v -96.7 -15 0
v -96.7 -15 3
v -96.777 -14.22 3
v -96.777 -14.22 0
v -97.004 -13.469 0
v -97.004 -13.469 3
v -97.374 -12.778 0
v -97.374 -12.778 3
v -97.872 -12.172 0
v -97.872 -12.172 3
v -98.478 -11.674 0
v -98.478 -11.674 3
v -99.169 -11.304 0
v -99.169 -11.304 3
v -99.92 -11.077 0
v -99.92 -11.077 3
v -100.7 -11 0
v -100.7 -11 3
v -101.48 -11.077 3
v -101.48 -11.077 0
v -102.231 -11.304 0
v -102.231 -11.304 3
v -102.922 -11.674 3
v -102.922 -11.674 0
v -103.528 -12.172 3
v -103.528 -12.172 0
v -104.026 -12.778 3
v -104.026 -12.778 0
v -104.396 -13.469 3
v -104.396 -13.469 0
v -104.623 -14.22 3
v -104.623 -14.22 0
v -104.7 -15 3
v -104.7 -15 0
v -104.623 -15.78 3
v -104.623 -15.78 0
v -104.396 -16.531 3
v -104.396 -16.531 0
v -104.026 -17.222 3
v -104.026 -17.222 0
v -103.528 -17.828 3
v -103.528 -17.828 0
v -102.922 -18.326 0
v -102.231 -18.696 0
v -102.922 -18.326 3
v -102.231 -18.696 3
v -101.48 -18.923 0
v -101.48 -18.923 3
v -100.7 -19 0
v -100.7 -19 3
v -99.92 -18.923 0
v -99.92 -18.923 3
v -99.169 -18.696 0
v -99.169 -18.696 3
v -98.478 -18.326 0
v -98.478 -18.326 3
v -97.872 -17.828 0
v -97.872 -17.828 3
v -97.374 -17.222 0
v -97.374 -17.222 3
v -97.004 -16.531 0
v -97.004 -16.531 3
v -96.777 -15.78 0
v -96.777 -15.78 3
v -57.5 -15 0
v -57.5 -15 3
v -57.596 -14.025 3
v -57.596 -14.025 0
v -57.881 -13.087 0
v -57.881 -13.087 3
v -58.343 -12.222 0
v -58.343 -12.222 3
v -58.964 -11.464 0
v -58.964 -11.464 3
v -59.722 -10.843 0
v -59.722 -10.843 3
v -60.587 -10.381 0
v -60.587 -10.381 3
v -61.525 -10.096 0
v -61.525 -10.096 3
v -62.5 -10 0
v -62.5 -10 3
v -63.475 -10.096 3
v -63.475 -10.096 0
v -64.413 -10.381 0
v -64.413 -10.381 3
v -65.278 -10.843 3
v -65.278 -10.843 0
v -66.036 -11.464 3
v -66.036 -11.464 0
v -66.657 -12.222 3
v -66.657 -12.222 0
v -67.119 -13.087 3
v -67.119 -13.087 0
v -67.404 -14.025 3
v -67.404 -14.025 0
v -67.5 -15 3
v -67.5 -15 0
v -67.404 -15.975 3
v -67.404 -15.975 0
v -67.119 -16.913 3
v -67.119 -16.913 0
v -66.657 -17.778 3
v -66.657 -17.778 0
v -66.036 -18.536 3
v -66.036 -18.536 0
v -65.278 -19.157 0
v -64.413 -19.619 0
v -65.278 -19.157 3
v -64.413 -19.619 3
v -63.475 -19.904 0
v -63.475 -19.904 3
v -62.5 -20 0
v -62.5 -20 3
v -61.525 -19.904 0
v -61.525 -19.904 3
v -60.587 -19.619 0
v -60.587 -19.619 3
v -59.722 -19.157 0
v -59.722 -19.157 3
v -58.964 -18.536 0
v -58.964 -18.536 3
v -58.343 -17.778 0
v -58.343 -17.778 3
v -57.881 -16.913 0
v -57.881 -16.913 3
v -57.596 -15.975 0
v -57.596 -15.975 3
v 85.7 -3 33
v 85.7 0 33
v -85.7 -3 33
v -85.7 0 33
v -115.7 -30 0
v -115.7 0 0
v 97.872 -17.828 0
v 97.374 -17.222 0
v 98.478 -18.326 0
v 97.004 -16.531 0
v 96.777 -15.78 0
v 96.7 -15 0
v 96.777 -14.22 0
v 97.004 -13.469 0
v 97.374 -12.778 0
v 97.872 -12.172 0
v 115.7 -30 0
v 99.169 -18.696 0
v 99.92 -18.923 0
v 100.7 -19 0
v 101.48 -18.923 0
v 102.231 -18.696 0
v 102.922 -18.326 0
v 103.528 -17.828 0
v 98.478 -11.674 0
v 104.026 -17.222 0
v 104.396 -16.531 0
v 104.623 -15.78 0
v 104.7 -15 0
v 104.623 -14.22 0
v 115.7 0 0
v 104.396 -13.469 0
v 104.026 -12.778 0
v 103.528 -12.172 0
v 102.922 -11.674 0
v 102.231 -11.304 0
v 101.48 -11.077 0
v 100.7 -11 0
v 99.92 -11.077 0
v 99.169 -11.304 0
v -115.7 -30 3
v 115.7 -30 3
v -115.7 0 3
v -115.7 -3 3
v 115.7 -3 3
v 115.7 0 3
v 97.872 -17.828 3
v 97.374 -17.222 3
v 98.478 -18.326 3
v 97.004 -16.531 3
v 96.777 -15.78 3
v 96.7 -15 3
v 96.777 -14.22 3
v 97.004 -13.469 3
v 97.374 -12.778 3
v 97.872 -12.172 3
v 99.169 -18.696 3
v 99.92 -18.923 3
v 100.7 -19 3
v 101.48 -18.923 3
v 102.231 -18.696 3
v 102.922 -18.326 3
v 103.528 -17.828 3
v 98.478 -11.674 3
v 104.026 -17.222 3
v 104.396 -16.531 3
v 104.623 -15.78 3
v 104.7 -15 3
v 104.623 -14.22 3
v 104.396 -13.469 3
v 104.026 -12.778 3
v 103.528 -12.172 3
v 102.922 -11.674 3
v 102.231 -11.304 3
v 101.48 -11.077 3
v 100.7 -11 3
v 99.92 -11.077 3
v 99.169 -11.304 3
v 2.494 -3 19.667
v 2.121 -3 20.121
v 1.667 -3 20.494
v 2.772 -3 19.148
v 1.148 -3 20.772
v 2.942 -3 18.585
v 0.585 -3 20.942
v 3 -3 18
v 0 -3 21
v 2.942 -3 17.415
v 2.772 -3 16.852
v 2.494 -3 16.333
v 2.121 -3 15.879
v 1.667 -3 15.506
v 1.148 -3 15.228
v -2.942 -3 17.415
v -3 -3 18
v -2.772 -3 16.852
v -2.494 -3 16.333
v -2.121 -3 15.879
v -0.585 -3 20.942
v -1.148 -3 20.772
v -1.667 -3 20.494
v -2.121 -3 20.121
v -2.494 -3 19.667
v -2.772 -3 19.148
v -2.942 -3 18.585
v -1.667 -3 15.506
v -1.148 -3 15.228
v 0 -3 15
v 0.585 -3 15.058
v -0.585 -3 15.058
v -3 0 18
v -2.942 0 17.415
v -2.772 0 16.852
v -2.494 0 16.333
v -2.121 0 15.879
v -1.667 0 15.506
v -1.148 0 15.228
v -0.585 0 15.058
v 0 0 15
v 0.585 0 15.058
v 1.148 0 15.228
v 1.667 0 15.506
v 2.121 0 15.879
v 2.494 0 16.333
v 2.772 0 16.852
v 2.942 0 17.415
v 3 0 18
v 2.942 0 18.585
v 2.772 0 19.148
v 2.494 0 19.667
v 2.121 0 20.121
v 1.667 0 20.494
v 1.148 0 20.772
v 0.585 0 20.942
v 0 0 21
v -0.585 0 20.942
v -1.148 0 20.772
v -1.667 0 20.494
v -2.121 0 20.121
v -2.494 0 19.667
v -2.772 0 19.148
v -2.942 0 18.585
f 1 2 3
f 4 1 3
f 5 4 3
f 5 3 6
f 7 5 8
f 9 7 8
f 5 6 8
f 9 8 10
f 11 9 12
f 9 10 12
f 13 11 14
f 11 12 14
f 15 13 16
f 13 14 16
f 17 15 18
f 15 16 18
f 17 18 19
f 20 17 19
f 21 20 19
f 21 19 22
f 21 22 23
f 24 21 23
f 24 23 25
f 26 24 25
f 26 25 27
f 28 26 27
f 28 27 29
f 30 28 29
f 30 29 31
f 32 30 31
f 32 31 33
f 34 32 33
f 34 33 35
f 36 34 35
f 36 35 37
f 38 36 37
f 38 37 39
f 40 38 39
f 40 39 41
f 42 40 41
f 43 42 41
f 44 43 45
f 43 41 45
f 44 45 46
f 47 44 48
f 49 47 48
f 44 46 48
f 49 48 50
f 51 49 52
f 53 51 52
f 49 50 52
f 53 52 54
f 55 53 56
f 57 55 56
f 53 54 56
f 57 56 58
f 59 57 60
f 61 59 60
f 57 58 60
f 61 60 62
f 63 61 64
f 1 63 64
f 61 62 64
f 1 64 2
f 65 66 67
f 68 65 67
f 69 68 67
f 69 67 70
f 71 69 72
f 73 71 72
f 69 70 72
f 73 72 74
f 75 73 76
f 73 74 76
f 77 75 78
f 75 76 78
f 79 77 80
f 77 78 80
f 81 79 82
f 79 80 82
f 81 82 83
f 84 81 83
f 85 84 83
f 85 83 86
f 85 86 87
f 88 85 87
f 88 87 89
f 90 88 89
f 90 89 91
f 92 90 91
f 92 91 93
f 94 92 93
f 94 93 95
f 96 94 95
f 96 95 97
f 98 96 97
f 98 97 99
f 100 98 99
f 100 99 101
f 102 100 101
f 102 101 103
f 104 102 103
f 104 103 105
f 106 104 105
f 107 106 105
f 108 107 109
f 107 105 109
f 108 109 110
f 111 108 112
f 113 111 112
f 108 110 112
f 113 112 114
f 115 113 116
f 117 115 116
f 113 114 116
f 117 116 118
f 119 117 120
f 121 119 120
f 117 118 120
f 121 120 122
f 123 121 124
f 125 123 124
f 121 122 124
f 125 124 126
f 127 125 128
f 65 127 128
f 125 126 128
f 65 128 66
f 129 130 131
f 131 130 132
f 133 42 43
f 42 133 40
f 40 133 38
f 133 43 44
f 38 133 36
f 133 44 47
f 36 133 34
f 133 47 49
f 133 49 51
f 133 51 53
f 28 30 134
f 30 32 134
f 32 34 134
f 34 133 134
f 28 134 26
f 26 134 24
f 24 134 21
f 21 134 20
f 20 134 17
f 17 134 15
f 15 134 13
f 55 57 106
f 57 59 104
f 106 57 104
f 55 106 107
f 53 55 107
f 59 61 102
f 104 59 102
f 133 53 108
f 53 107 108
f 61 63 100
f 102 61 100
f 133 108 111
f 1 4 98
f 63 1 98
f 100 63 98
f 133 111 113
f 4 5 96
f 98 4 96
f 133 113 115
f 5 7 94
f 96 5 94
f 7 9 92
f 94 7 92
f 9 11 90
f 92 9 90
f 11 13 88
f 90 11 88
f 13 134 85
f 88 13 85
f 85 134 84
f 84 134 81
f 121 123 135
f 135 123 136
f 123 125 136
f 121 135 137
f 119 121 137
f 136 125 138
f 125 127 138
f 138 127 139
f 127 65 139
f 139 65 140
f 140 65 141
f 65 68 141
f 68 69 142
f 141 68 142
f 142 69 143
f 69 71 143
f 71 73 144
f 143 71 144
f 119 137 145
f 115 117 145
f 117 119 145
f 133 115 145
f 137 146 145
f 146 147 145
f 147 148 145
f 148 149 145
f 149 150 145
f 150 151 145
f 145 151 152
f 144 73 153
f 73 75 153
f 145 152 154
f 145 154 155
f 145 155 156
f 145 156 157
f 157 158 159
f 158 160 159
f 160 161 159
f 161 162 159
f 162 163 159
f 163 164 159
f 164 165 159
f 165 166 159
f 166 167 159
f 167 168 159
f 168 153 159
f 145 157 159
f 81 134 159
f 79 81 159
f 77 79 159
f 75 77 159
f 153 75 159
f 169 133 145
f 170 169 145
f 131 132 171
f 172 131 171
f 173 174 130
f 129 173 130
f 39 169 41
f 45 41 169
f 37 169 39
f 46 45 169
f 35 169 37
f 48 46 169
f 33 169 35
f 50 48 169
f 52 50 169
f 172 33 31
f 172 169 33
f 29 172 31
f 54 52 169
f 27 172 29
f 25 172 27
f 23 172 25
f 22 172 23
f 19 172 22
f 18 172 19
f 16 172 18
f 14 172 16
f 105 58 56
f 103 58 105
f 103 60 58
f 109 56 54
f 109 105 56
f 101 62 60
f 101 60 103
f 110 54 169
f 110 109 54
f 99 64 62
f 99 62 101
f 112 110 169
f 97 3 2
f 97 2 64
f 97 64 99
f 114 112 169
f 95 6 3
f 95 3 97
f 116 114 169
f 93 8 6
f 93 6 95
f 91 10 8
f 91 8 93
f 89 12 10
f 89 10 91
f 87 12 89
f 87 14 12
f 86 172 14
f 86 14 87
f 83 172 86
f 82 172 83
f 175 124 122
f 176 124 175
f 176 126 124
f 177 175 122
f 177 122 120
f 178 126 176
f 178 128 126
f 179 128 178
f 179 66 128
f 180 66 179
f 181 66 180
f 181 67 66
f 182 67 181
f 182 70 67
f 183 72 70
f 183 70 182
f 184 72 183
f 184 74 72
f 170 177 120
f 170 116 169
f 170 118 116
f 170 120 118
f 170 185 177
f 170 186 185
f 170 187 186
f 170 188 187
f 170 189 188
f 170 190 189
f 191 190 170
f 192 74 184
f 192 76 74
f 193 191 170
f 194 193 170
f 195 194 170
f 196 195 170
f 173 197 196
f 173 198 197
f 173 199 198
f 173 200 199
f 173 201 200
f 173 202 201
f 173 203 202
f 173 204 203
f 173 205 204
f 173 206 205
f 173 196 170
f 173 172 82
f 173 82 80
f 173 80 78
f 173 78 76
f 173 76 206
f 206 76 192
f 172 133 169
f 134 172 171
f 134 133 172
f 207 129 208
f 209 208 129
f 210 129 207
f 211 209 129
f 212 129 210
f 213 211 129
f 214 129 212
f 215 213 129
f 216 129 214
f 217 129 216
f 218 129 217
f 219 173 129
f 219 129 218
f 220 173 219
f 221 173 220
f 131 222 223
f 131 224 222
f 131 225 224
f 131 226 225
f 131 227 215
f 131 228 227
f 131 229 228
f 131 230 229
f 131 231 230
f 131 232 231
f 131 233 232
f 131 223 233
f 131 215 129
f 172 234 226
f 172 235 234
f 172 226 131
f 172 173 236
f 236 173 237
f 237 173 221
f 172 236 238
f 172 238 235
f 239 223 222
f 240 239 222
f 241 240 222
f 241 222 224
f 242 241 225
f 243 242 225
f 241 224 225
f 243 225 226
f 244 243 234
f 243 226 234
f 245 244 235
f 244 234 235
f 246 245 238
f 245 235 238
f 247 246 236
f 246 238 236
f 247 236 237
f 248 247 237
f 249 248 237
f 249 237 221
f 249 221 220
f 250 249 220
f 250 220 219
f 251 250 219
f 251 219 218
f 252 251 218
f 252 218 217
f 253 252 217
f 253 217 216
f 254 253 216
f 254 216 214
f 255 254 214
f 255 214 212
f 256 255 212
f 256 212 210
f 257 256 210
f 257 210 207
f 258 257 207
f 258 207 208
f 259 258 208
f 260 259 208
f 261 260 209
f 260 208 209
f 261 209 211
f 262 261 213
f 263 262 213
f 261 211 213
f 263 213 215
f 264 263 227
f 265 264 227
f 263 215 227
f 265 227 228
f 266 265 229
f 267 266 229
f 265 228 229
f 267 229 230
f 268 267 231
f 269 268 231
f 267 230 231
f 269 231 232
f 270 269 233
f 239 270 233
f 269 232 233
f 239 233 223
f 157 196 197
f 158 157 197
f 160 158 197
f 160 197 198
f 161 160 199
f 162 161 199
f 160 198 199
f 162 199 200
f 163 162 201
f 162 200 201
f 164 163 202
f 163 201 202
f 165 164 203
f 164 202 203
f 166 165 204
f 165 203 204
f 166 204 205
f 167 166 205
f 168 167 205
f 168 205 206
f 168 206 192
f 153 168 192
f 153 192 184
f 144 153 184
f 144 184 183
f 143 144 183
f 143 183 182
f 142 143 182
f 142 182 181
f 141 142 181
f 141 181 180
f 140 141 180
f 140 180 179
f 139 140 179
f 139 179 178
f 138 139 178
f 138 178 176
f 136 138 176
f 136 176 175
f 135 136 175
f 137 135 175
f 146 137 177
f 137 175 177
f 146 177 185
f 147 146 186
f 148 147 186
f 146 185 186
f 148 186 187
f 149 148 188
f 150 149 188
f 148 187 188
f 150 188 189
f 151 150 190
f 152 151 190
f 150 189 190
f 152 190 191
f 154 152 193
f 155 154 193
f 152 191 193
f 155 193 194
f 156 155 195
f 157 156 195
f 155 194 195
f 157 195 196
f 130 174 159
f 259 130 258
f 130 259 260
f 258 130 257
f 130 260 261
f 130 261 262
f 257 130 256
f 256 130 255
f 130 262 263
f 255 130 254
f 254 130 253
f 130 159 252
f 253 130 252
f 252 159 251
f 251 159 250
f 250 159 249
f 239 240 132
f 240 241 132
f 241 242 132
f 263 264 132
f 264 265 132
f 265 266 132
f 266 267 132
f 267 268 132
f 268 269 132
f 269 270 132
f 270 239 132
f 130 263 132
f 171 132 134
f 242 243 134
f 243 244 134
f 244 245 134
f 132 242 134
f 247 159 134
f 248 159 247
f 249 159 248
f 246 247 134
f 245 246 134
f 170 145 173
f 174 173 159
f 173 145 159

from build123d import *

# Parameters (mm, degrees)
SKETCH1_W                  = 231.4
SKETCH1_H                  = 30
BOSS_EXTRUDE1_DEPTH        = 3
BOSS_EXTRUDE2_DEPTH        = 3
F_8_0_8_DIAMETER_HOLE1_D   = 8
F_10_0_10_DIAMETER_HOLE1_D = 10
F_6_0_6_DIAMETER_HOLE1_D   = 6


with BuildPart() as part:
    # Sketch1 → Boss-Extrude1 (new body)
    with BuildSketch(Plane.XY):
        with Locations((0, -15)):
            Rectangle(SKETCH1_W, SKETCH1_H)
    extrude(amount=BOSS_EXTRUDE1_DEPTH)

    # Sketch2 → Boss-Extrude2 (add)
    with BuildSketch(Plane(origin=(0, 0, 0), x_dir=(1, 0, 0), z_dir=(0, 1, 0))):
        Polygon((-115.7, -3), (115.7, -3), (85.7, -33), (-85.7, -33), align=None)
    extrude(amount=-BOSS_EXTRUDE2_DEPTH)

    # Ø8.0 (8) Diameter Hole1 (through all)
    with Locations(Plane(origin=(0, 0, 0), x_dir=(-1, 0, 0), z_dir=(0, 0, -1))):
        with Locations((-100.7, -15), (100.7, -15)):
            Hole(F_8_0_8_DIAMETER_HOLE1_D / 2)

    # Ø10.0 (10) Diameter Hole1 (through all)
    with Locations(Plane(origin=(0, 0, 0), x_dir=(-1, 0, 0), z_dir=(0, 0, -1))):
        with Locations((62.5, -15)):
            Hole(F_10_0_10_DIAMETER_HOLE1_D / 2)

    # Ø6.0 (6) Diameter Hole1 (through all)
    with Locations(Plane(origin=(0, 0, 0), x_dir=(1, 0, 0), z_dir=(0, 1, 0))):
        with Locations((0, -18)):
            Hole(F_6_0_6_DIAMETER_HOLE1_D / 2)


solid = part.part
